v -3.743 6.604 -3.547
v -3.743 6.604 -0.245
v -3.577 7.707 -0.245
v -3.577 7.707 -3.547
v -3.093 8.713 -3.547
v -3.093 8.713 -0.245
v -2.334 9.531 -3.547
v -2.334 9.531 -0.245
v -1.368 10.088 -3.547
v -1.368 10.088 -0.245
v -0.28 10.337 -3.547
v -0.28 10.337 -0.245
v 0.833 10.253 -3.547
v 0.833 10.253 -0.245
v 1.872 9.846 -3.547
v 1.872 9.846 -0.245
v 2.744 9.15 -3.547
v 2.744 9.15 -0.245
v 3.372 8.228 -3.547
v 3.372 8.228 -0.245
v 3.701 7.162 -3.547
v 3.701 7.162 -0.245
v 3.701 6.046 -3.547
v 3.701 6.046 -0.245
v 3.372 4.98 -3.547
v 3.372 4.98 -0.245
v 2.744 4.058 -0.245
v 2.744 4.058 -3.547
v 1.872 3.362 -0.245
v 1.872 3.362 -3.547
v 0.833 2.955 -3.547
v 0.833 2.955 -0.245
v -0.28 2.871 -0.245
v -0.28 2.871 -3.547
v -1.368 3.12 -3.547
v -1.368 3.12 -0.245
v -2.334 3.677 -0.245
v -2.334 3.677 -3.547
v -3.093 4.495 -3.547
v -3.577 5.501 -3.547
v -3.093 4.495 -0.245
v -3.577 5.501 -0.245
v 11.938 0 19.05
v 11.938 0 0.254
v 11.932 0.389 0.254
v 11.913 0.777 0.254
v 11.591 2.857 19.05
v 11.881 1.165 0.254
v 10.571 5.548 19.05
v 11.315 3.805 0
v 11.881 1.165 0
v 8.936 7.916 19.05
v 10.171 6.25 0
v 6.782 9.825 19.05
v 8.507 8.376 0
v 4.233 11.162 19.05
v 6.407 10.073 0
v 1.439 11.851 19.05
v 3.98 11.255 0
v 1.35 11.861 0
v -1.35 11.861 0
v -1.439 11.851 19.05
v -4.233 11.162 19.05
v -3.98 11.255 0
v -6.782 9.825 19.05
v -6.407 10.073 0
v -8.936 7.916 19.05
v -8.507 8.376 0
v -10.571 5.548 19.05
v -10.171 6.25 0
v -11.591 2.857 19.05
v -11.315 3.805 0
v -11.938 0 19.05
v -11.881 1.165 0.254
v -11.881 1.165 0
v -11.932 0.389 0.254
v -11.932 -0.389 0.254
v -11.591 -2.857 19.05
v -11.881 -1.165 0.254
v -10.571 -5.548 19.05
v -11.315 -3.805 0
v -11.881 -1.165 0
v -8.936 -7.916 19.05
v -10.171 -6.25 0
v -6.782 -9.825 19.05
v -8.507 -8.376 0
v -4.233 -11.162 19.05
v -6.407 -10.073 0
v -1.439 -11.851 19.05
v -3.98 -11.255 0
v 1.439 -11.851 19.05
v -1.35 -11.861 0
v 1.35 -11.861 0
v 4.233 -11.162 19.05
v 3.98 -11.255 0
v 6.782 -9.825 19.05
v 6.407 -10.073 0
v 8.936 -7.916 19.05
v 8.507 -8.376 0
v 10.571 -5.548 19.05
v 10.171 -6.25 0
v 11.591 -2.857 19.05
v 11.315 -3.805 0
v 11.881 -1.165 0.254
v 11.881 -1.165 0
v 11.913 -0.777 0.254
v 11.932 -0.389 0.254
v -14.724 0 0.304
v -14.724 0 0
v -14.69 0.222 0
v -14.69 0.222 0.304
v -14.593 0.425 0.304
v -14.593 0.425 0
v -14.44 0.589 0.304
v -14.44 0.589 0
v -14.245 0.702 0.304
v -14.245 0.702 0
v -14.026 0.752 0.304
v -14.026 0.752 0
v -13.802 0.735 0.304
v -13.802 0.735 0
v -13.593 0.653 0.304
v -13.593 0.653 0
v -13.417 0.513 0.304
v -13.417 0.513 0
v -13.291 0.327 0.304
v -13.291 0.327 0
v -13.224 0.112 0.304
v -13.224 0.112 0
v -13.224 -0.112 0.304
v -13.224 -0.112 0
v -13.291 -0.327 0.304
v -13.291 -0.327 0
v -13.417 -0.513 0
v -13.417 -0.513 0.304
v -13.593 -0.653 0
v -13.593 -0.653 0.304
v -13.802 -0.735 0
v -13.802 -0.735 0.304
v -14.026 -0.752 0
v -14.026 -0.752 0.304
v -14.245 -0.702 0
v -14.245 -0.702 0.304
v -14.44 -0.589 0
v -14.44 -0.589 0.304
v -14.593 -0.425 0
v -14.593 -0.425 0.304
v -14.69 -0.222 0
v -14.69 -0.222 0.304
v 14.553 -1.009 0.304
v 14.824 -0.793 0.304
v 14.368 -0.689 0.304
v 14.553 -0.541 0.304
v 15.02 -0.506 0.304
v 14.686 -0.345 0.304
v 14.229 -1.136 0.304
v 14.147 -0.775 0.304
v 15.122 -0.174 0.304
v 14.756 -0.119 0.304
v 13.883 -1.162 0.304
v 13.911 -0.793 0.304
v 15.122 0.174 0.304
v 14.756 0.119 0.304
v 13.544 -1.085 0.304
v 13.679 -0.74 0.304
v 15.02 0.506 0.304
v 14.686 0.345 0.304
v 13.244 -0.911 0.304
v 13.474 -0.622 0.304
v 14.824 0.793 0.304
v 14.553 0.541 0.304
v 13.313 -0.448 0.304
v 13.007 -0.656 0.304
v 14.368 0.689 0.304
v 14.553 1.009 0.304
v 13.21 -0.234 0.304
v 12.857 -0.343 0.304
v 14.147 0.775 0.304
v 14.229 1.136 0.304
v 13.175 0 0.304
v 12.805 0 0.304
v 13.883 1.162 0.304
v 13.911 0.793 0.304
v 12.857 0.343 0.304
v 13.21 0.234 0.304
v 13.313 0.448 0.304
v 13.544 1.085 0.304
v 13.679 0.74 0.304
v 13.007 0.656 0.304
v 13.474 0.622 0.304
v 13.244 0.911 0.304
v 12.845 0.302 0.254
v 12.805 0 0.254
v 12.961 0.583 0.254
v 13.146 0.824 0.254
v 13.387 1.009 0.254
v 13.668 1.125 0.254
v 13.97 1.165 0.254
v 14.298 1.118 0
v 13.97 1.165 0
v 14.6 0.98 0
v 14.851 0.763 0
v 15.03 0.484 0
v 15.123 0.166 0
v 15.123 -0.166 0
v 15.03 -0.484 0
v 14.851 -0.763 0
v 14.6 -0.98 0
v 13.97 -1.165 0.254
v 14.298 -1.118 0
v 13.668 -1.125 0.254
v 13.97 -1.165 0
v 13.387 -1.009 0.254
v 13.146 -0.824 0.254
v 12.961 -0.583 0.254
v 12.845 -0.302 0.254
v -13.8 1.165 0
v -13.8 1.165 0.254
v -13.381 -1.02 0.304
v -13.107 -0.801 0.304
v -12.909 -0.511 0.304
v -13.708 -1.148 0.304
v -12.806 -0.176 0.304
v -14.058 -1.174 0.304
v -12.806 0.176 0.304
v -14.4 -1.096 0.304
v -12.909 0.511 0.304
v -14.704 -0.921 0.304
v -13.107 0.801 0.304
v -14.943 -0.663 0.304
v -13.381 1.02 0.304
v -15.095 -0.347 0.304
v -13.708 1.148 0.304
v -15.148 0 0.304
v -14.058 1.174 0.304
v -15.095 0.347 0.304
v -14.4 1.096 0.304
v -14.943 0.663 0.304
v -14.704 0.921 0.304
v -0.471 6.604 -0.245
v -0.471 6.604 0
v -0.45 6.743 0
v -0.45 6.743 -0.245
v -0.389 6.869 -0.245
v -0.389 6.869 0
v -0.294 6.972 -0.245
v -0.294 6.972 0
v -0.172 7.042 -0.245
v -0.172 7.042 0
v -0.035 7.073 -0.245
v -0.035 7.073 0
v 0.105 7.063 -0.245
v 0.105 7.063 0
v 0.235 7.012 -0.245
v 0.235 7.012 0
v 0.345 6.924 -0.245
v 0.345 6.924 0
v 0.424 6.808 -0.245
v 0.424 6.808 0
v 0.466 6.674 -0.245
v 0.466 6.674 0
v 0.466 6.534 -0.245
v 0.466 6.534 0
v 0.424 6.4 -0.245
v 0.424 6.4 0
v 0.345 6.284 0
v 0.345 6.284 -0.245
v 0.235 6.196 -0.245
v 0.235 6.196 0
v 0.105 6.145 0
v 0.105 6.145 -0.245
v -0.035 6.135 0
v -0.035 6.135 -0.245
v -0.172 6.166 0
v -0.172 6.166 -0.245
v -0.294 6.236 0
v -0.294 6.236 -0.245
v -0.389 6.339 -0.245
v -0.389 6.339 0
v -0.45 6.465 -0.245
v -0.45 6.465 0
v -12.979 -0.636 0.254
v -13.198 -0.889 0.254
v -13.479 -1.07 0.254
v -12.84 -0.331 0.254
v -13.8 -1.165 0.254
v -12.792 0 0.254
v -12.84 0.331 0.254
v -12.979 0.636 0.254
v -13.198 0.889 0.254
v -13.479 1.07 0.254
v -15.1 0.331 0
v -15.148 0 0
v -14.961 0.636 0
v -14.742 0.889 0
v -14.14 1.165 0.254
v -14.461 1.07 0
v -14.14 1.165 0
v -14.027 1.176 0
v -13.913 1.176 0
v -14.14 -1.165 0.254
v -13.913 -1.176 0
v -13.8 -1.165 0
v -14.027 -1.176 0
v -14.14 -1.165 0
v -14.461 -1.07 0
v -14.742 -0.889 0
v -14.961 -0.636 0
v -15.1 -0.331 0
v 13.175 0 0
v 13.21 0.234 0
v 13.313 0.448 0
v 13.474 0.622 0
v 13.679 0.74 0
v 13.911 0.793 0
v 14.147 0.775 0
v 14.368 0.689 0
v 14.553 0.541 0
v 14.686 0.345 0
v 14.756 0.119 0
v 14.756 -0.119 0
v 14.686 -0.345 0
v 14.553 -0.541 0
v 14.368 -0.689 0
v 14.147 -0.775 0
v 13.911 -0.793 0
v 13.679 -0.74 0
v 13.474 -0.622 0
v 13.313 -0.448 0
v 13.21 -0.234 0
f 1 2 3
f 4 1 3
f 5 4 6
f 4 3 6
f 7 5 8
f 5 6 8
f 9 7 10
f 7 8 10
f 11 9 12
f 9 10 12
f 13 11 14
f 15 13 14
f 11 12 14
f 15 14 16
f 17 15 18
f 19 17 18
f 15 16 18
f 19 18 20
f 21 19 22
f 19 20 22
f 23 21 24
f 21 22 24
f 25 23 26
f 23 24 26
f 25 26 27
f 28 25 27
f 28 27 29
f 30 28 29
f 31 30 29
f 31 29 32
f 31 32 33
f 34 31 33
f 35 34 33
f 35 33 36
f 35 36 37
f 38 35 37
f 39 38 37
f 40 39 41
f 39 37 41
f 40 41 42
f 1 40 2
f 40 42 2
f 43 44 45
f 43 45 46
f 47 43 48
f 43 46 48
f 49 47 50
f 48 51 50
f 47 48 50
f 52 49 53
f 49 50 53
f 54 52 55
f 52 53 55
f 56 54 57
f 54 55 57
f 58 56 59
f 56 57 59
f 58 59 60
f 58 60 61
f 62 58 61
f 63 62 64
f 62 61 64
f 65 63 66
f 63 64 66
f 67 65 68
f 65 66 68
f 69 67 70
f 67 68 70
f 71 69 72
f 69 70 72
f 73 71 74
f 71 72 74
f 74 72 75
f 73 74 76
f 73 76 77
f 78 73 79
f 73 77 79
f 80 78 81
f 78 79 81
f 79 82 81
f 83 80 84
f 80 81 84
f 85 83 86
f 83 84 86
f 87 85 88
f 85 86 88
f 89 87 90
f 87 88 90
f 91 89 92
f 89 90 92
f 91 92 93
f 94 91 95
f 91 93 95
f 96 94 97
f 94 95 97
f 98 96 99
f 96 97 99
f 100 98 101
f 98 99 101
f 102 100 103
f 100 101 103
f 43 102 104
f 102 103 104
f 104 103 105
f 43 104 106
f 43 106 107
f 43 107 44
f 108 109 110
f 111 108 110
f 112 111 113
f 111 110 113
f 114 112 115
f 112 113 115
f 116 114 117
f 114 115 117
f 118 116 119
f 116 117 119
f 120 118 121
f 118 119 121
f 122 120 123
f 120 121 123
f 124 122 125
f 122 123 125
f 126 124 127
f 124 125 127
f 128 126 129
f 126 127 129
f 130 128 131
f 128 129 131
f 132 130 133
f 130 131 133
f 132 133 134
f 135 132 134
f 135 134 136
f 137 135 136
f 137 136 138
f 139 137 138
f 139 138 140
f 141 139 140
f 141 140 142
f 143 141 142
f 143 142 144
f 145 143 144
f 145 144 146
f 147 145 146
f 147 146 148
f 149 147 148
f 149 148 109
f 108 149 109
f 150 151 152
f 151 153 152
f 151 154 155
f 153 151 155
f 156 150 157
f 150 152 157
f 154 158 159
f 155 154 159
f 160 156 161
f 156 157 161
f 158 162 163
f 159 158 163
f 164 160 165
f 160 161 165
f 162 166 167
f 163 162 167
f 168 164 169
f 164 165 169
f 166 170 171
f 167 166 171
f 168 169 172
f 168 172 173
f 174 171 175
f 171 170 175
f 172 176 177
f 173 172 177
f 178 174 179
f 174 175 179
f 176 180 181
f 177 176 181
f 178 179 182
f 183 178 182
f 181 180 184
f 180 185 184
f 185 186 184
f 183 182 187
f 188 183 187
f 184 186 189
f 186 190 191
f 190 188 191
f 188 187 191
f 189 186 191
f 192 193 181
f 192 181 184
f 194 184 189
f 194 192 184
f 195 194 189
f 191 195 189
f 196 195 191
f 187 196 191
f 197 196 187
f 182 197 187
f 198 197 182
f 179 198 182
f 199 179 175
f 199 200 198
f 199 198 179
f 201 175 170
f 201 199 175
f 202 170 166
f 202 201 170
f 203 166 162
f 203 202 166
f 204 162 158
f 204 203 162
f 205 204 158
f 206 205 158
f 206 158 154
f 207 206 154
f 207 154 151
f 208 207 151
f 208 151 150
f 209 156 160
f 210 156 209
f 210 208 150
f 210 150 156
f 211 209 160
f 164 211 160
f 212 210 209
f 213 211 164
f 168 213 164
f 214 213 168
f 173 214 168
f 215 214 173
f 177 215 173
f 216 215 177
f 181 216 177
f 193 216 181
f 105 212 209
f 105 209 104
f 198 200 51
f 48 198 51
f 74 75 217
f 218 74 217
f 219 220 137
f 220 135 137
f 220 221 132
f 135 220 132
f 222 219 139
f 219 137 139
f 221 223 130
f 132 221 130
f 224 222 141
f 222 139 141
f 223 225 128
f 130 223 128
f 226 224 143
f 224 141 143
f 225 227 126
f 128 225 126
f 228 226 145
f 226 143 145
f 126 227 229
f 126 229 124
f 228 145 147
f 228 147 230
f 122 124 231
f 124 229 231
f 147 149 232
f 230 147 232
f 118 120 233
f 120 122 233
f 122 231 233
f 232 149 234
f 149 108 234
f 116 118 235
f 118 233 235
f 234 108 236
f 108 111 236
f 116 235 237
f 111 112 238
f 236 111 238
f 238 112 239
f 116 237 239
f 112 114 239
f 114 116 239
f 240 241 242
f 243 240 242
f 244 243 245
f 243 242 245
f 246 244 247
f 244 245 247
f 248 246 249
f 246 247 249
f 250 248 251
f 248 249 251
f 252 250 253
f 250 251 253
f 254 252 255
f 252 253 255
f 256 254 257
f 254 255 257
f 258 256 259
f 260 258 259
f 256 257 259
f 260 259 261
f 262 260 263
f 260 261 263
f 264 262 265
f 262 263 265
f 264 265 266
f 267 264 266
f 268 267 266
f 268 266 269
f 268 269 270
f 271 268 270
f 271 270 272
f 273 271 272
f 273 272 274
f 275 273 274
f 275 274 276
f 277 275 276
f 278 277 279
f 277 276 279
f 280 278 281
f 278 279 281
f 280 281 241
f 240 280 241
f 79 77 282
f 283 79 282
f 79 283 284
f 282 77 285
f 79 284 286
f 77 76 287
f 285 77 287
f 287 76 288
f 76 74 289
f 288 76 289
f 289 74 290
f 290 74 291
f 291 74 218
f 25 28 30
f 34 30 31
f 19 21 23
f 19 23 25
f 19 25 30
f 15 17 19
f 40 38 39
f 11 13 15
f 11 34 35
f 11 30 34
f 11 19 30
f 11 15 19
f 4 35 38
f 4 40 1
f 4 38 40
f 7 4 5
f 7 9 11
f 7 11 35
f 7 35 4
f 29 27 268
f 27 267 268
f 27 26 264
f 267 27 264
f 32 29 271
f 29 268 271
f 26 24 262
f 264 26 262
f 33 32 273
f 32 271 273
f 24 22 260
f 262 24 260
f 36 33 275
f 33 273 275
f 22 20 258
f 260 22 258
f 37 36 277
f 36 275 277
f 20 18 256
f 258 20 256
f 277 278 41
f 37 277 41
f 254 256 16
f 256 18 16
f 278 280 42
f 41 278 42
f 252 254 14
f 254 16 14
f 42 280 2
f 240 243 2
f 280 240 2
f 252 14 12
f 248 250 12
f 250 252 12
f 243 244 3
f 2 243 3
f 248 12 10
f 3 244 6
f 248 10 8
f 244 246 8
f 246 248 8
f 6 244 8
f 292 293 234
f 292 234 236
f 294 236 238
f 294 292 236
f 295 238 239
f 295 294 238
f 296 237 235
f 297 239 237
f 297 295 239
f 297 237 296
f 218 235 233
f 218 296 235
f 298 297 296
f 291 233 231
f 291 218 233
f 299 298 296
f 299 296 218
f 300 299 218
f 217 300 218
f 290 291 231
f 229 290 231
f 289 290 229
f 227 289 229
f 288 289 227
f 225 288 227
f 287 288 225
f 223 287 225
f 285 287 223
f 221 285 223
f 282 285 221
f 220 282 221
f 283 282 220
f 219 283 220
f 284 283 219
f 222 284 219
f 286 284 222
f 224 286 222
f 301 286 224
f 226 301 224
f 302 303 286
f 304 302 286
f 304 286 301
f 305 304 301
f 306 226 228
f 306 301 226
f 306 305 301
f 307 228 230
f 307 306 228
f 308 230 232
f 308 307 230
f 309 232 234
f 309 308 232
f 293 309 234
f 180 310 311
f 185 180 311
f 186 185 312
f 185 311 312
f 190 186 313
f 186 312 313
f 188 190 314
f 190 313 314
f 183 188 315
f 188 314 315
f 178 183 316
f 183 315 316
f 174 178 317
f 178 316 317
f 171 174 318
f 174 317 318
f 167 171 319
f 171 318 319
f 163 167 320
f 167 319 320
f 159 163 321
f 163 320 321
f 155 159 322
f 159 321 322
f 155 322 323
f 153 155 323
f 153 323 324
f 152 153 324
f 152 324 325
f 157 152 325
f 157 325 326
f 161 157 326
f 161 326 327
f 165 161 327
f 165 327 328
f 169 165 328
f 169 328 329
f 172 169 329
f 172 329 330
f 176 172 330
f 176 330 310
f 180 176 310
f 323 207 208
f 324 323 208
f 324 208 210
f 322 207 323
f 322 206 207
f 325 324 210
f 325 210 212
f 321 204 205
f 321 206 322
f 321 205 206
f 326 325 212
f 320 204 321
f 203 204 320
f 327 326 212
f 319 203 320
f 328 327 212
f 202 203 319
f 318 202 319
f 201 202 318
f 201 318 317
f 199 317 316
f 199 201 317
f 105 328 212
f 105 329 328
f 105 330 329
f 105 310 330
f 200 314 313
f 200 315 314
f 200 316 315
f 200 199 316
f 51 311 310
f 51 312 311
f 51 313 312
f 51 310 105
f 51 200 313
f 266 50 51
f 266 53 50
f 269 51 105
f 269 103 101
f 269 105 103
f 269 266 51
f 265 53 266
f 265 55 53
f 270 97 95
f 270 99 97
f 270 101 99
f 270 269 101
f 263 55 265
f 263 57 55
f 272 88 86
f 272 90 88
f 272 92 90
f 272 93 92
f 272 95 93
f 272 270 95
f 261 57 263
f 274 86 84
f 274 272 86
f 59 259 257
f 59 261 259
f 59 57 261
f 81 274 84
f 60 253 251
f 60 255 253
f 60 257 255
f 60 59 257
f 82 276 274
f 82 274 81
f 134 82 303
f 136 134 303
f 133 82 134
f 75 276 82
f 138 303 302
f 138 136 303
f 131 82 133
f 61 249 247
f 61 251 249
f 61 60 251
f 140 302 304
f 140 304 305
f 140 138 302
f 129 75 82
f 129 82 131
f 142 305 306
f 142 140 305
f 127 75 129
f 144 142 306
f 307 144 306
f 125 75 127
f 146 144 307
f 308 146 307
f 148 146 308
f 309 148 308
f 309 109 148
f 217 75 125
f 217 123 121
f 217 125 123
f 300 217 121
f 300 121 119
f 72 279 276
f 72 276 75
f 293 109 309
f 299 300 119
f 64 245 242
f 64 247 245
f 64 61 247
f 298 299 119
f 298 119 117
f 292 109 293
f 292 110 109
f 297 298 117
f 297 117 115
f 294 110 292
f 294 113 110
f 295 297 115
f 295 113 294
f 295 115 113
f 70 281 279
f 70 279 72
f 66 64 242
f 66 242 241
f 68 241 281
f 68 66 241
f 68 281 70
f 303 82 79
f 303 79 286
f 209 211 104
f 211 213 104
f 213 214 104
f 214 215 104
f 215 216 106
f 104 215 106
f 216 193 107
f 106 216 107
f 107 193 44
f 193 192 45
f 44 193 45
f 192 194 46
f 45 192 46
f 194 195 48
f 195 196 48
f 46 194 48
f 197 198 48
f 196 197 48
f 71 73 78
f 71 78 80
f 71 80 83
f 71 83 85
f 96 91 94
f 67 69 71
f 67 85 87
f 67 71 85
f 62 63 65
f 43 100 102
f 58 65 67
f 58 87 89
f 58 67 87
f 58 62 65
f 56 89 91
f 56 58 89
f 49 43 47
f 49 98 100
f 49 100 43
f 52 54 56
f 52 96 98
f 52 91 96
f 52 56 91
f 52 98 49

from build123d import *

# Parameters (mm, degrees)
SKETCH1_R             = 11.938
BOSS_EXTRUDE1_DEPTH   = 19.05
SKETCH2_R             = 1.177518958
BOSS_EXTRUDE2_DEPTH   = 0.304204724
SKETCH2_R_2           = 1.16518976
BOSS_EXTRUDE2_2_DEPTH = 0.304204724
SKETCH3_W             = 28.109952108
SKETCH3_H             = 2.33037952
BOSS_EXTRUDE3_DEPTH   = 0.254
SKETCH4_R             = 0.795236377
CUT_EXTRUDE1_DEPTH    = 0.905720074
SKETCH5_R             = 0.753950063
CUT_EXTRUDE2_DEPTH    = 1.016
SKETCH6_R             = 0.47077468
BOSS_EXTRUDE4_DEPTH   = 0.245031324
SKETCH8_R             = 3.743161578
BOSS_EXTRUDE5_DEPTH   = 3.302


with BuildPart() as part:
    # Sketch1 → Boss-Extrude1 (new body)
    with BuildSketch(Plane.XY):
        Circle(SKETCH1_R)
    extrude(amount=BOSS_EXTRUDE1_DEPTH)



with BuildPart() as body_2:
    # Sketch2 → Boss-Extrude2 (new body)
    with BuildSketch(Plane(origin=(0, 0, 0), x_dir=(-1, 0, 0), z_dir=(0, 0, -1))):
        with Locations((13.97, 0)):
            Circle(SKETCH2_R)
    extrude(amount=-BOSS_EXTRUDE2_DEPTH)


with BuildPart() as body_3:
    # Sketch2 → Boss-Extrude2 2 (new body)
    with BuildSketch(Plane(origin=(0, 0, 0), x_dir=(-1, 0, 0), z_dir=(0, 0, -1))):
        with Locations((-13.97, 0)):
            Circle(SKETCH2_R_2)
    extrude(amount=-BOSS_EXTRUDE2_2_DEPTH)


with BuildPart() as part_1:
    add(part.part)

    add(body_2.part)  # Boss-Extrude3 merges body 2

    add(body_3.part)  # Boss-Extrude3 merges body 3
    # Sketch3 → Boss-Extrude3 (add)
    with BuildSketch(Plane(origin=(0, 0, 0), x_dir=(-1, 0, 0), z_dir=(0, 0, -1))):
        with Locations((0.084976054, 0)):
            Rectangle(SKETCH3_W, SKETCH3_H)
    extrude(amount=-BOSS_EXTRUDE3_DEPTH)

    # Sketch4 → Cut-Extrude1 (cut)
    with BuildSketch(Plane(origin=(0, 0, 0), x_dir=(-1, 0, 0), z_dir=(0, 0, -1))):
        with Locations((-13.97, 0)):
            Circle(SKETCH4_R)
    extrude(amount=-CUT_EXTRUDE1_DEPTH, mode=Mode.SUBTRACT)

    # Sketch5 → Cut-Extrude2 (cut)
    with BuildSketch(Plane(origin=(0, 0, 0), x_dir=(-1, 0, 0), z_dir=(0, 0, -1))):
        with Locations((13.97, 0)):
            Circle(SKETCH5_R)
    extrude(amount=-CUT_EXTRUDE2_DEPTH, mode=Mode.SUBTRACT)

    # Sketch6 → Boss-Extrude4 (add)
    with BuildSketch(Plane(origin=(0, 0, 0), x_dir=(-1, 0, 0), z_dir=(0, 0, -1))):
        with Locations((0, 6.604)):
            Circle(SKETCH6_R)
    extrude(amount=BOSS_EXTRUDE4_DEPTH)

    # Sketch8 → Boss-Extrude5 (add)
    with BuildSketch(Plane(origin=(0, 0, -0.245031324), x_dir=(-1, 0, 0), z_dir=(0, 0, -1))):
        with Locations((0, 6.604)):
            Circle(SKETCH8_R)
    extrude(amount=BOSS_EXTRUDE5_DEPTH)


solid = part_1.part
